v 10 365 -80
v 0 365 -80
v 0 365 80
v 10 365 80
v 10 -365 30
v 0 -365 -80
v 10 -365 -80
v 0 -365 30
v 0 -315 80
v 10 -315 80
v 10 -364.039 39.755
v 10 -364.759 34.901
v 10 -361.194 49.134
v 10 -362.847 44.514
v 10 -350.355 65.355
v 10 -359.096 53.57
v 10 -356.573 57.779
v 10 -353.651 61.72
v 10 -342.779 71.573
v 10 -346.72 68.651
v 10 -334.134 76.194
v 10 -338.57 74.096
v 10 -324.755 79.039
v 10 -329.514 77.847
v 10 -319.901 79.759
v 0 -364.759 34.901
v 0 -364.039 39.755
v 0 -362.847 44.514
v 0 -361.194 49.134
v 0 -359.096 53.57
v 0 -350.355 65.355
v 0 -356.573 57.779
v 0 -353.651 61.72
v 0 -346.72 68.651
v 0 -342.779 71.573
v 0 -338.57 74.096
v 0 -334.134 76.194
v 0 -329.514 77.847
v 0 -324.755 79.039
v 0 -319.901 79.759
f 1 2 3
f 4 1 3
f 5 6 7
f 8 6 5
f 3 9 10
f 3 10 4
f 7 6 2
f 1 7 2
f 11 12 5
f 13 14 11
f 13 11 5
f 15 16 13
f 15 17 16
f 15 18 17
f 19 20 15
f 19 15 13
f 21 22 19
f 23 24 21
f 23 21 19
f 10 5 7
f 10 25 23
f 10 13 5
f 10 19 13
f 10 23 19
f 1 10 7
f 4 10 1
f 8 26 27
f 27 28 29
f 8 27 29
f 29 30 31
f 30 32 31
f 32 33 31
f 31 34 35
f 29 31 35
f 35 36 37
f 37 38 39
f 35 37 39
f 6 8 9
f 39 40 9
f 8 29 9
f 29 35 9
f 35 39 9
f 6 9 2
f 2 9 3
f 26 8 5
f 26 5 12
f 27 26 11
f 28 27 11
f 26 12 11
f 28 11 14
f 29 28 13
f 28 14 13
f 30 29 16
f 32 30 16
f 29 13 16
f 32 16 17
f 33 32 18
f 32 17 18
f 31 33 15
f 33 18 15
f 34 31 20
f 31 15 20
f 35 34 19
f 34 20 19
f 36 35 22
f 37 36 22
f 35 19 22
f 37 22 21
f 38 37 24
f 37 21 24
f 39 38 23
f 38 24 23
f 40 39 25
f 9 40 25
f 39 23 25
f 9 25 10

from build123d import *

# Parameters (mm, degrees)
F0_W     = 730
F0_H     = 160
F1_DEPTH = 10
F2_R     = 50


with BuildPart() as f1:
    # F0 (on Right) → F1 (new body)
    with BuildSketch(Plane.YZ):
        Rectangle(F0_W, F0_H)
    extrude(amount=F1_DEPTH)

    # F2
    f2_edges = [f1.edges().sort_by_distance(p)[0] for p in [
        (5, -365, 80),
    ]]
    fillet(f2_edges, radius=F2_R)


solid = f1.part
